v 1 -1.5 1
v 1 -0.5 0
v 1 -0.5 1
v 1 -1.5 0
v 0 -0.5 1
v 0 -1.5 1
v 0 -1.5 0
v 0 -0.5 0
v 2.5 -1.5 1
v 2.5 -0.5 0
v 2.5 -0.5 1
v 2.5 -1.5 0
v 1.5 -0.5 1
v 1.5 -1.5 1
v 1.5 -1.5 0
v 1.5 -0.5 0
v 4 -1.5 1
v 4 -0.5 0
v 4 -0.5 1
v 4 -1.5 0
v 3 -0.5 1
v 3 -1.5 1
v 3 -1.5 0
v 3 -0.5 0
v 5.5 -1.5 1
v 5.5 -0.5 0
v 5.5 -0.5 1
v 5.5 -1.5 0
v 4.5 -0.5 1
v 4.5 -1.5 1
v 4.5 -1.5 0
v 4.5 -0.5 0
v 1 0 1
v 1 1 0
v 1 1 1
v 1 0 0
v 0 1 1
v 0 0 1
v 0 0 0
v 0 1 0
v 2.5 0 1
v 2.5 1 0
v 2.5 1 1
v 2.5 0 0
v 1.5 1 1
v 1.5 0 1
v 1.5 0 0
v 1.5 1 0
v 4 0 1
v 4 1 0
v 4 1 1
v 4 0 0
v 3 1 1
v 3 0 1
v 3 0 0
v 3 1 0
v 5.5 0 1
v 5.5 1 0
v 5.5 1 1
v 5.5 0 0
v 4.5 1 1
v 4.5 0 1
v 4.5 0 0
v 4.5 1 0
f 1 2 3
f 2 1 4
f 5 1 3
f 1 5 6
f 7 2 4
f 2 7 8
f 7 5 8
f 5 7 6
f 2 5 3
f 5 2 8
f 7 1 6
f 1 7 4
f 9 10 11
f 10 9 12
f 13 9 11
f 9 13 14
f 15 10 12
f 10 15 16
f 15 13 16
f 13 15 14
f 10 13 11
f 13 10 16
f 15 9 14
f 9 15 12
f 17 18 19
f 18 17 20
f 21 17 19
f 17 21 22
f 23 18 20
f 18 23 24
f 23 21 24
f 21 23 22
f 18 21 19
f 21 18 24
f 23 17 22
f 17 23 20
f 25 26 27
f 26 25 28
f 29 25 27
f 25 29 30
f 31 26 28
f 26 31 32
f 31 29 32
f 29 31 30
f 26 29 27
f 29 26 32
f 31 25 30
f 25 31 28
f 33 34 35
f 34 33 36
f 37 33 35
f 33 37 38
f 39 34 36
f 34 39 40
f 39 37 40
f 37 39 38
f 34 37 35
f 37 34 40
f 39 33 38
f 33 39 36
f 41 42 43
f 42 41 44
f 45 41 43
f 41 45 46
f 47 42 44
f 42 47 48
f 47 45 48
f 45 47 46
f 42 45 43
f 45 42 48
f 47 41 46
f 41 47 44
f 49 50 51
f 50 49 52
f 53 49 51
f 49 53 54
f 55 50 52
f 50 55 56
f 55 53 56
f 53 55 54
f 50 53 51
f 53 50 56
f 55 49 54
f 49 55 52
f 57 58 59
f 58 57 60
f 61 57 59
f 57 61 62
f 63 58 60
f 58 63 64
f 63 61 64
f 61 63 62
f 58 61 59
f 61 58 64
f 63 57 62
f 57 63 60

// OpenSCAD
color4 = [1,1,1,1]; // [-1.1:.1:5.1]
setUndef = false;
noParent = true;

parentCol= setUndef ? undef : color4;

ce=[0,0,0,1];

color([ce.r])
  cube();
translate([1.5,0,0])
  color([ce.r,ce.g])
    cube();
translate([3,0,0])
  color([ce.r,ce.g,ce.b])
    cube();
translate([4.5,0,0])
  color([ce.r,ce.g,ce.b,ce.a])
    cube();

translate([0,-1.5,0]){
  d=[.7,.7,.7,.7];

    color([d.r])
      cube();
  translate([1.5,0,0])
    color([d.r,d.g])
      cube();
  translate([3,0,0])
    color([d.r,d.g,d.b])
      cube();
  translate([4.5,0,0])
    color([d.r,d.g,d.b,d.a])
      cube();
  }
